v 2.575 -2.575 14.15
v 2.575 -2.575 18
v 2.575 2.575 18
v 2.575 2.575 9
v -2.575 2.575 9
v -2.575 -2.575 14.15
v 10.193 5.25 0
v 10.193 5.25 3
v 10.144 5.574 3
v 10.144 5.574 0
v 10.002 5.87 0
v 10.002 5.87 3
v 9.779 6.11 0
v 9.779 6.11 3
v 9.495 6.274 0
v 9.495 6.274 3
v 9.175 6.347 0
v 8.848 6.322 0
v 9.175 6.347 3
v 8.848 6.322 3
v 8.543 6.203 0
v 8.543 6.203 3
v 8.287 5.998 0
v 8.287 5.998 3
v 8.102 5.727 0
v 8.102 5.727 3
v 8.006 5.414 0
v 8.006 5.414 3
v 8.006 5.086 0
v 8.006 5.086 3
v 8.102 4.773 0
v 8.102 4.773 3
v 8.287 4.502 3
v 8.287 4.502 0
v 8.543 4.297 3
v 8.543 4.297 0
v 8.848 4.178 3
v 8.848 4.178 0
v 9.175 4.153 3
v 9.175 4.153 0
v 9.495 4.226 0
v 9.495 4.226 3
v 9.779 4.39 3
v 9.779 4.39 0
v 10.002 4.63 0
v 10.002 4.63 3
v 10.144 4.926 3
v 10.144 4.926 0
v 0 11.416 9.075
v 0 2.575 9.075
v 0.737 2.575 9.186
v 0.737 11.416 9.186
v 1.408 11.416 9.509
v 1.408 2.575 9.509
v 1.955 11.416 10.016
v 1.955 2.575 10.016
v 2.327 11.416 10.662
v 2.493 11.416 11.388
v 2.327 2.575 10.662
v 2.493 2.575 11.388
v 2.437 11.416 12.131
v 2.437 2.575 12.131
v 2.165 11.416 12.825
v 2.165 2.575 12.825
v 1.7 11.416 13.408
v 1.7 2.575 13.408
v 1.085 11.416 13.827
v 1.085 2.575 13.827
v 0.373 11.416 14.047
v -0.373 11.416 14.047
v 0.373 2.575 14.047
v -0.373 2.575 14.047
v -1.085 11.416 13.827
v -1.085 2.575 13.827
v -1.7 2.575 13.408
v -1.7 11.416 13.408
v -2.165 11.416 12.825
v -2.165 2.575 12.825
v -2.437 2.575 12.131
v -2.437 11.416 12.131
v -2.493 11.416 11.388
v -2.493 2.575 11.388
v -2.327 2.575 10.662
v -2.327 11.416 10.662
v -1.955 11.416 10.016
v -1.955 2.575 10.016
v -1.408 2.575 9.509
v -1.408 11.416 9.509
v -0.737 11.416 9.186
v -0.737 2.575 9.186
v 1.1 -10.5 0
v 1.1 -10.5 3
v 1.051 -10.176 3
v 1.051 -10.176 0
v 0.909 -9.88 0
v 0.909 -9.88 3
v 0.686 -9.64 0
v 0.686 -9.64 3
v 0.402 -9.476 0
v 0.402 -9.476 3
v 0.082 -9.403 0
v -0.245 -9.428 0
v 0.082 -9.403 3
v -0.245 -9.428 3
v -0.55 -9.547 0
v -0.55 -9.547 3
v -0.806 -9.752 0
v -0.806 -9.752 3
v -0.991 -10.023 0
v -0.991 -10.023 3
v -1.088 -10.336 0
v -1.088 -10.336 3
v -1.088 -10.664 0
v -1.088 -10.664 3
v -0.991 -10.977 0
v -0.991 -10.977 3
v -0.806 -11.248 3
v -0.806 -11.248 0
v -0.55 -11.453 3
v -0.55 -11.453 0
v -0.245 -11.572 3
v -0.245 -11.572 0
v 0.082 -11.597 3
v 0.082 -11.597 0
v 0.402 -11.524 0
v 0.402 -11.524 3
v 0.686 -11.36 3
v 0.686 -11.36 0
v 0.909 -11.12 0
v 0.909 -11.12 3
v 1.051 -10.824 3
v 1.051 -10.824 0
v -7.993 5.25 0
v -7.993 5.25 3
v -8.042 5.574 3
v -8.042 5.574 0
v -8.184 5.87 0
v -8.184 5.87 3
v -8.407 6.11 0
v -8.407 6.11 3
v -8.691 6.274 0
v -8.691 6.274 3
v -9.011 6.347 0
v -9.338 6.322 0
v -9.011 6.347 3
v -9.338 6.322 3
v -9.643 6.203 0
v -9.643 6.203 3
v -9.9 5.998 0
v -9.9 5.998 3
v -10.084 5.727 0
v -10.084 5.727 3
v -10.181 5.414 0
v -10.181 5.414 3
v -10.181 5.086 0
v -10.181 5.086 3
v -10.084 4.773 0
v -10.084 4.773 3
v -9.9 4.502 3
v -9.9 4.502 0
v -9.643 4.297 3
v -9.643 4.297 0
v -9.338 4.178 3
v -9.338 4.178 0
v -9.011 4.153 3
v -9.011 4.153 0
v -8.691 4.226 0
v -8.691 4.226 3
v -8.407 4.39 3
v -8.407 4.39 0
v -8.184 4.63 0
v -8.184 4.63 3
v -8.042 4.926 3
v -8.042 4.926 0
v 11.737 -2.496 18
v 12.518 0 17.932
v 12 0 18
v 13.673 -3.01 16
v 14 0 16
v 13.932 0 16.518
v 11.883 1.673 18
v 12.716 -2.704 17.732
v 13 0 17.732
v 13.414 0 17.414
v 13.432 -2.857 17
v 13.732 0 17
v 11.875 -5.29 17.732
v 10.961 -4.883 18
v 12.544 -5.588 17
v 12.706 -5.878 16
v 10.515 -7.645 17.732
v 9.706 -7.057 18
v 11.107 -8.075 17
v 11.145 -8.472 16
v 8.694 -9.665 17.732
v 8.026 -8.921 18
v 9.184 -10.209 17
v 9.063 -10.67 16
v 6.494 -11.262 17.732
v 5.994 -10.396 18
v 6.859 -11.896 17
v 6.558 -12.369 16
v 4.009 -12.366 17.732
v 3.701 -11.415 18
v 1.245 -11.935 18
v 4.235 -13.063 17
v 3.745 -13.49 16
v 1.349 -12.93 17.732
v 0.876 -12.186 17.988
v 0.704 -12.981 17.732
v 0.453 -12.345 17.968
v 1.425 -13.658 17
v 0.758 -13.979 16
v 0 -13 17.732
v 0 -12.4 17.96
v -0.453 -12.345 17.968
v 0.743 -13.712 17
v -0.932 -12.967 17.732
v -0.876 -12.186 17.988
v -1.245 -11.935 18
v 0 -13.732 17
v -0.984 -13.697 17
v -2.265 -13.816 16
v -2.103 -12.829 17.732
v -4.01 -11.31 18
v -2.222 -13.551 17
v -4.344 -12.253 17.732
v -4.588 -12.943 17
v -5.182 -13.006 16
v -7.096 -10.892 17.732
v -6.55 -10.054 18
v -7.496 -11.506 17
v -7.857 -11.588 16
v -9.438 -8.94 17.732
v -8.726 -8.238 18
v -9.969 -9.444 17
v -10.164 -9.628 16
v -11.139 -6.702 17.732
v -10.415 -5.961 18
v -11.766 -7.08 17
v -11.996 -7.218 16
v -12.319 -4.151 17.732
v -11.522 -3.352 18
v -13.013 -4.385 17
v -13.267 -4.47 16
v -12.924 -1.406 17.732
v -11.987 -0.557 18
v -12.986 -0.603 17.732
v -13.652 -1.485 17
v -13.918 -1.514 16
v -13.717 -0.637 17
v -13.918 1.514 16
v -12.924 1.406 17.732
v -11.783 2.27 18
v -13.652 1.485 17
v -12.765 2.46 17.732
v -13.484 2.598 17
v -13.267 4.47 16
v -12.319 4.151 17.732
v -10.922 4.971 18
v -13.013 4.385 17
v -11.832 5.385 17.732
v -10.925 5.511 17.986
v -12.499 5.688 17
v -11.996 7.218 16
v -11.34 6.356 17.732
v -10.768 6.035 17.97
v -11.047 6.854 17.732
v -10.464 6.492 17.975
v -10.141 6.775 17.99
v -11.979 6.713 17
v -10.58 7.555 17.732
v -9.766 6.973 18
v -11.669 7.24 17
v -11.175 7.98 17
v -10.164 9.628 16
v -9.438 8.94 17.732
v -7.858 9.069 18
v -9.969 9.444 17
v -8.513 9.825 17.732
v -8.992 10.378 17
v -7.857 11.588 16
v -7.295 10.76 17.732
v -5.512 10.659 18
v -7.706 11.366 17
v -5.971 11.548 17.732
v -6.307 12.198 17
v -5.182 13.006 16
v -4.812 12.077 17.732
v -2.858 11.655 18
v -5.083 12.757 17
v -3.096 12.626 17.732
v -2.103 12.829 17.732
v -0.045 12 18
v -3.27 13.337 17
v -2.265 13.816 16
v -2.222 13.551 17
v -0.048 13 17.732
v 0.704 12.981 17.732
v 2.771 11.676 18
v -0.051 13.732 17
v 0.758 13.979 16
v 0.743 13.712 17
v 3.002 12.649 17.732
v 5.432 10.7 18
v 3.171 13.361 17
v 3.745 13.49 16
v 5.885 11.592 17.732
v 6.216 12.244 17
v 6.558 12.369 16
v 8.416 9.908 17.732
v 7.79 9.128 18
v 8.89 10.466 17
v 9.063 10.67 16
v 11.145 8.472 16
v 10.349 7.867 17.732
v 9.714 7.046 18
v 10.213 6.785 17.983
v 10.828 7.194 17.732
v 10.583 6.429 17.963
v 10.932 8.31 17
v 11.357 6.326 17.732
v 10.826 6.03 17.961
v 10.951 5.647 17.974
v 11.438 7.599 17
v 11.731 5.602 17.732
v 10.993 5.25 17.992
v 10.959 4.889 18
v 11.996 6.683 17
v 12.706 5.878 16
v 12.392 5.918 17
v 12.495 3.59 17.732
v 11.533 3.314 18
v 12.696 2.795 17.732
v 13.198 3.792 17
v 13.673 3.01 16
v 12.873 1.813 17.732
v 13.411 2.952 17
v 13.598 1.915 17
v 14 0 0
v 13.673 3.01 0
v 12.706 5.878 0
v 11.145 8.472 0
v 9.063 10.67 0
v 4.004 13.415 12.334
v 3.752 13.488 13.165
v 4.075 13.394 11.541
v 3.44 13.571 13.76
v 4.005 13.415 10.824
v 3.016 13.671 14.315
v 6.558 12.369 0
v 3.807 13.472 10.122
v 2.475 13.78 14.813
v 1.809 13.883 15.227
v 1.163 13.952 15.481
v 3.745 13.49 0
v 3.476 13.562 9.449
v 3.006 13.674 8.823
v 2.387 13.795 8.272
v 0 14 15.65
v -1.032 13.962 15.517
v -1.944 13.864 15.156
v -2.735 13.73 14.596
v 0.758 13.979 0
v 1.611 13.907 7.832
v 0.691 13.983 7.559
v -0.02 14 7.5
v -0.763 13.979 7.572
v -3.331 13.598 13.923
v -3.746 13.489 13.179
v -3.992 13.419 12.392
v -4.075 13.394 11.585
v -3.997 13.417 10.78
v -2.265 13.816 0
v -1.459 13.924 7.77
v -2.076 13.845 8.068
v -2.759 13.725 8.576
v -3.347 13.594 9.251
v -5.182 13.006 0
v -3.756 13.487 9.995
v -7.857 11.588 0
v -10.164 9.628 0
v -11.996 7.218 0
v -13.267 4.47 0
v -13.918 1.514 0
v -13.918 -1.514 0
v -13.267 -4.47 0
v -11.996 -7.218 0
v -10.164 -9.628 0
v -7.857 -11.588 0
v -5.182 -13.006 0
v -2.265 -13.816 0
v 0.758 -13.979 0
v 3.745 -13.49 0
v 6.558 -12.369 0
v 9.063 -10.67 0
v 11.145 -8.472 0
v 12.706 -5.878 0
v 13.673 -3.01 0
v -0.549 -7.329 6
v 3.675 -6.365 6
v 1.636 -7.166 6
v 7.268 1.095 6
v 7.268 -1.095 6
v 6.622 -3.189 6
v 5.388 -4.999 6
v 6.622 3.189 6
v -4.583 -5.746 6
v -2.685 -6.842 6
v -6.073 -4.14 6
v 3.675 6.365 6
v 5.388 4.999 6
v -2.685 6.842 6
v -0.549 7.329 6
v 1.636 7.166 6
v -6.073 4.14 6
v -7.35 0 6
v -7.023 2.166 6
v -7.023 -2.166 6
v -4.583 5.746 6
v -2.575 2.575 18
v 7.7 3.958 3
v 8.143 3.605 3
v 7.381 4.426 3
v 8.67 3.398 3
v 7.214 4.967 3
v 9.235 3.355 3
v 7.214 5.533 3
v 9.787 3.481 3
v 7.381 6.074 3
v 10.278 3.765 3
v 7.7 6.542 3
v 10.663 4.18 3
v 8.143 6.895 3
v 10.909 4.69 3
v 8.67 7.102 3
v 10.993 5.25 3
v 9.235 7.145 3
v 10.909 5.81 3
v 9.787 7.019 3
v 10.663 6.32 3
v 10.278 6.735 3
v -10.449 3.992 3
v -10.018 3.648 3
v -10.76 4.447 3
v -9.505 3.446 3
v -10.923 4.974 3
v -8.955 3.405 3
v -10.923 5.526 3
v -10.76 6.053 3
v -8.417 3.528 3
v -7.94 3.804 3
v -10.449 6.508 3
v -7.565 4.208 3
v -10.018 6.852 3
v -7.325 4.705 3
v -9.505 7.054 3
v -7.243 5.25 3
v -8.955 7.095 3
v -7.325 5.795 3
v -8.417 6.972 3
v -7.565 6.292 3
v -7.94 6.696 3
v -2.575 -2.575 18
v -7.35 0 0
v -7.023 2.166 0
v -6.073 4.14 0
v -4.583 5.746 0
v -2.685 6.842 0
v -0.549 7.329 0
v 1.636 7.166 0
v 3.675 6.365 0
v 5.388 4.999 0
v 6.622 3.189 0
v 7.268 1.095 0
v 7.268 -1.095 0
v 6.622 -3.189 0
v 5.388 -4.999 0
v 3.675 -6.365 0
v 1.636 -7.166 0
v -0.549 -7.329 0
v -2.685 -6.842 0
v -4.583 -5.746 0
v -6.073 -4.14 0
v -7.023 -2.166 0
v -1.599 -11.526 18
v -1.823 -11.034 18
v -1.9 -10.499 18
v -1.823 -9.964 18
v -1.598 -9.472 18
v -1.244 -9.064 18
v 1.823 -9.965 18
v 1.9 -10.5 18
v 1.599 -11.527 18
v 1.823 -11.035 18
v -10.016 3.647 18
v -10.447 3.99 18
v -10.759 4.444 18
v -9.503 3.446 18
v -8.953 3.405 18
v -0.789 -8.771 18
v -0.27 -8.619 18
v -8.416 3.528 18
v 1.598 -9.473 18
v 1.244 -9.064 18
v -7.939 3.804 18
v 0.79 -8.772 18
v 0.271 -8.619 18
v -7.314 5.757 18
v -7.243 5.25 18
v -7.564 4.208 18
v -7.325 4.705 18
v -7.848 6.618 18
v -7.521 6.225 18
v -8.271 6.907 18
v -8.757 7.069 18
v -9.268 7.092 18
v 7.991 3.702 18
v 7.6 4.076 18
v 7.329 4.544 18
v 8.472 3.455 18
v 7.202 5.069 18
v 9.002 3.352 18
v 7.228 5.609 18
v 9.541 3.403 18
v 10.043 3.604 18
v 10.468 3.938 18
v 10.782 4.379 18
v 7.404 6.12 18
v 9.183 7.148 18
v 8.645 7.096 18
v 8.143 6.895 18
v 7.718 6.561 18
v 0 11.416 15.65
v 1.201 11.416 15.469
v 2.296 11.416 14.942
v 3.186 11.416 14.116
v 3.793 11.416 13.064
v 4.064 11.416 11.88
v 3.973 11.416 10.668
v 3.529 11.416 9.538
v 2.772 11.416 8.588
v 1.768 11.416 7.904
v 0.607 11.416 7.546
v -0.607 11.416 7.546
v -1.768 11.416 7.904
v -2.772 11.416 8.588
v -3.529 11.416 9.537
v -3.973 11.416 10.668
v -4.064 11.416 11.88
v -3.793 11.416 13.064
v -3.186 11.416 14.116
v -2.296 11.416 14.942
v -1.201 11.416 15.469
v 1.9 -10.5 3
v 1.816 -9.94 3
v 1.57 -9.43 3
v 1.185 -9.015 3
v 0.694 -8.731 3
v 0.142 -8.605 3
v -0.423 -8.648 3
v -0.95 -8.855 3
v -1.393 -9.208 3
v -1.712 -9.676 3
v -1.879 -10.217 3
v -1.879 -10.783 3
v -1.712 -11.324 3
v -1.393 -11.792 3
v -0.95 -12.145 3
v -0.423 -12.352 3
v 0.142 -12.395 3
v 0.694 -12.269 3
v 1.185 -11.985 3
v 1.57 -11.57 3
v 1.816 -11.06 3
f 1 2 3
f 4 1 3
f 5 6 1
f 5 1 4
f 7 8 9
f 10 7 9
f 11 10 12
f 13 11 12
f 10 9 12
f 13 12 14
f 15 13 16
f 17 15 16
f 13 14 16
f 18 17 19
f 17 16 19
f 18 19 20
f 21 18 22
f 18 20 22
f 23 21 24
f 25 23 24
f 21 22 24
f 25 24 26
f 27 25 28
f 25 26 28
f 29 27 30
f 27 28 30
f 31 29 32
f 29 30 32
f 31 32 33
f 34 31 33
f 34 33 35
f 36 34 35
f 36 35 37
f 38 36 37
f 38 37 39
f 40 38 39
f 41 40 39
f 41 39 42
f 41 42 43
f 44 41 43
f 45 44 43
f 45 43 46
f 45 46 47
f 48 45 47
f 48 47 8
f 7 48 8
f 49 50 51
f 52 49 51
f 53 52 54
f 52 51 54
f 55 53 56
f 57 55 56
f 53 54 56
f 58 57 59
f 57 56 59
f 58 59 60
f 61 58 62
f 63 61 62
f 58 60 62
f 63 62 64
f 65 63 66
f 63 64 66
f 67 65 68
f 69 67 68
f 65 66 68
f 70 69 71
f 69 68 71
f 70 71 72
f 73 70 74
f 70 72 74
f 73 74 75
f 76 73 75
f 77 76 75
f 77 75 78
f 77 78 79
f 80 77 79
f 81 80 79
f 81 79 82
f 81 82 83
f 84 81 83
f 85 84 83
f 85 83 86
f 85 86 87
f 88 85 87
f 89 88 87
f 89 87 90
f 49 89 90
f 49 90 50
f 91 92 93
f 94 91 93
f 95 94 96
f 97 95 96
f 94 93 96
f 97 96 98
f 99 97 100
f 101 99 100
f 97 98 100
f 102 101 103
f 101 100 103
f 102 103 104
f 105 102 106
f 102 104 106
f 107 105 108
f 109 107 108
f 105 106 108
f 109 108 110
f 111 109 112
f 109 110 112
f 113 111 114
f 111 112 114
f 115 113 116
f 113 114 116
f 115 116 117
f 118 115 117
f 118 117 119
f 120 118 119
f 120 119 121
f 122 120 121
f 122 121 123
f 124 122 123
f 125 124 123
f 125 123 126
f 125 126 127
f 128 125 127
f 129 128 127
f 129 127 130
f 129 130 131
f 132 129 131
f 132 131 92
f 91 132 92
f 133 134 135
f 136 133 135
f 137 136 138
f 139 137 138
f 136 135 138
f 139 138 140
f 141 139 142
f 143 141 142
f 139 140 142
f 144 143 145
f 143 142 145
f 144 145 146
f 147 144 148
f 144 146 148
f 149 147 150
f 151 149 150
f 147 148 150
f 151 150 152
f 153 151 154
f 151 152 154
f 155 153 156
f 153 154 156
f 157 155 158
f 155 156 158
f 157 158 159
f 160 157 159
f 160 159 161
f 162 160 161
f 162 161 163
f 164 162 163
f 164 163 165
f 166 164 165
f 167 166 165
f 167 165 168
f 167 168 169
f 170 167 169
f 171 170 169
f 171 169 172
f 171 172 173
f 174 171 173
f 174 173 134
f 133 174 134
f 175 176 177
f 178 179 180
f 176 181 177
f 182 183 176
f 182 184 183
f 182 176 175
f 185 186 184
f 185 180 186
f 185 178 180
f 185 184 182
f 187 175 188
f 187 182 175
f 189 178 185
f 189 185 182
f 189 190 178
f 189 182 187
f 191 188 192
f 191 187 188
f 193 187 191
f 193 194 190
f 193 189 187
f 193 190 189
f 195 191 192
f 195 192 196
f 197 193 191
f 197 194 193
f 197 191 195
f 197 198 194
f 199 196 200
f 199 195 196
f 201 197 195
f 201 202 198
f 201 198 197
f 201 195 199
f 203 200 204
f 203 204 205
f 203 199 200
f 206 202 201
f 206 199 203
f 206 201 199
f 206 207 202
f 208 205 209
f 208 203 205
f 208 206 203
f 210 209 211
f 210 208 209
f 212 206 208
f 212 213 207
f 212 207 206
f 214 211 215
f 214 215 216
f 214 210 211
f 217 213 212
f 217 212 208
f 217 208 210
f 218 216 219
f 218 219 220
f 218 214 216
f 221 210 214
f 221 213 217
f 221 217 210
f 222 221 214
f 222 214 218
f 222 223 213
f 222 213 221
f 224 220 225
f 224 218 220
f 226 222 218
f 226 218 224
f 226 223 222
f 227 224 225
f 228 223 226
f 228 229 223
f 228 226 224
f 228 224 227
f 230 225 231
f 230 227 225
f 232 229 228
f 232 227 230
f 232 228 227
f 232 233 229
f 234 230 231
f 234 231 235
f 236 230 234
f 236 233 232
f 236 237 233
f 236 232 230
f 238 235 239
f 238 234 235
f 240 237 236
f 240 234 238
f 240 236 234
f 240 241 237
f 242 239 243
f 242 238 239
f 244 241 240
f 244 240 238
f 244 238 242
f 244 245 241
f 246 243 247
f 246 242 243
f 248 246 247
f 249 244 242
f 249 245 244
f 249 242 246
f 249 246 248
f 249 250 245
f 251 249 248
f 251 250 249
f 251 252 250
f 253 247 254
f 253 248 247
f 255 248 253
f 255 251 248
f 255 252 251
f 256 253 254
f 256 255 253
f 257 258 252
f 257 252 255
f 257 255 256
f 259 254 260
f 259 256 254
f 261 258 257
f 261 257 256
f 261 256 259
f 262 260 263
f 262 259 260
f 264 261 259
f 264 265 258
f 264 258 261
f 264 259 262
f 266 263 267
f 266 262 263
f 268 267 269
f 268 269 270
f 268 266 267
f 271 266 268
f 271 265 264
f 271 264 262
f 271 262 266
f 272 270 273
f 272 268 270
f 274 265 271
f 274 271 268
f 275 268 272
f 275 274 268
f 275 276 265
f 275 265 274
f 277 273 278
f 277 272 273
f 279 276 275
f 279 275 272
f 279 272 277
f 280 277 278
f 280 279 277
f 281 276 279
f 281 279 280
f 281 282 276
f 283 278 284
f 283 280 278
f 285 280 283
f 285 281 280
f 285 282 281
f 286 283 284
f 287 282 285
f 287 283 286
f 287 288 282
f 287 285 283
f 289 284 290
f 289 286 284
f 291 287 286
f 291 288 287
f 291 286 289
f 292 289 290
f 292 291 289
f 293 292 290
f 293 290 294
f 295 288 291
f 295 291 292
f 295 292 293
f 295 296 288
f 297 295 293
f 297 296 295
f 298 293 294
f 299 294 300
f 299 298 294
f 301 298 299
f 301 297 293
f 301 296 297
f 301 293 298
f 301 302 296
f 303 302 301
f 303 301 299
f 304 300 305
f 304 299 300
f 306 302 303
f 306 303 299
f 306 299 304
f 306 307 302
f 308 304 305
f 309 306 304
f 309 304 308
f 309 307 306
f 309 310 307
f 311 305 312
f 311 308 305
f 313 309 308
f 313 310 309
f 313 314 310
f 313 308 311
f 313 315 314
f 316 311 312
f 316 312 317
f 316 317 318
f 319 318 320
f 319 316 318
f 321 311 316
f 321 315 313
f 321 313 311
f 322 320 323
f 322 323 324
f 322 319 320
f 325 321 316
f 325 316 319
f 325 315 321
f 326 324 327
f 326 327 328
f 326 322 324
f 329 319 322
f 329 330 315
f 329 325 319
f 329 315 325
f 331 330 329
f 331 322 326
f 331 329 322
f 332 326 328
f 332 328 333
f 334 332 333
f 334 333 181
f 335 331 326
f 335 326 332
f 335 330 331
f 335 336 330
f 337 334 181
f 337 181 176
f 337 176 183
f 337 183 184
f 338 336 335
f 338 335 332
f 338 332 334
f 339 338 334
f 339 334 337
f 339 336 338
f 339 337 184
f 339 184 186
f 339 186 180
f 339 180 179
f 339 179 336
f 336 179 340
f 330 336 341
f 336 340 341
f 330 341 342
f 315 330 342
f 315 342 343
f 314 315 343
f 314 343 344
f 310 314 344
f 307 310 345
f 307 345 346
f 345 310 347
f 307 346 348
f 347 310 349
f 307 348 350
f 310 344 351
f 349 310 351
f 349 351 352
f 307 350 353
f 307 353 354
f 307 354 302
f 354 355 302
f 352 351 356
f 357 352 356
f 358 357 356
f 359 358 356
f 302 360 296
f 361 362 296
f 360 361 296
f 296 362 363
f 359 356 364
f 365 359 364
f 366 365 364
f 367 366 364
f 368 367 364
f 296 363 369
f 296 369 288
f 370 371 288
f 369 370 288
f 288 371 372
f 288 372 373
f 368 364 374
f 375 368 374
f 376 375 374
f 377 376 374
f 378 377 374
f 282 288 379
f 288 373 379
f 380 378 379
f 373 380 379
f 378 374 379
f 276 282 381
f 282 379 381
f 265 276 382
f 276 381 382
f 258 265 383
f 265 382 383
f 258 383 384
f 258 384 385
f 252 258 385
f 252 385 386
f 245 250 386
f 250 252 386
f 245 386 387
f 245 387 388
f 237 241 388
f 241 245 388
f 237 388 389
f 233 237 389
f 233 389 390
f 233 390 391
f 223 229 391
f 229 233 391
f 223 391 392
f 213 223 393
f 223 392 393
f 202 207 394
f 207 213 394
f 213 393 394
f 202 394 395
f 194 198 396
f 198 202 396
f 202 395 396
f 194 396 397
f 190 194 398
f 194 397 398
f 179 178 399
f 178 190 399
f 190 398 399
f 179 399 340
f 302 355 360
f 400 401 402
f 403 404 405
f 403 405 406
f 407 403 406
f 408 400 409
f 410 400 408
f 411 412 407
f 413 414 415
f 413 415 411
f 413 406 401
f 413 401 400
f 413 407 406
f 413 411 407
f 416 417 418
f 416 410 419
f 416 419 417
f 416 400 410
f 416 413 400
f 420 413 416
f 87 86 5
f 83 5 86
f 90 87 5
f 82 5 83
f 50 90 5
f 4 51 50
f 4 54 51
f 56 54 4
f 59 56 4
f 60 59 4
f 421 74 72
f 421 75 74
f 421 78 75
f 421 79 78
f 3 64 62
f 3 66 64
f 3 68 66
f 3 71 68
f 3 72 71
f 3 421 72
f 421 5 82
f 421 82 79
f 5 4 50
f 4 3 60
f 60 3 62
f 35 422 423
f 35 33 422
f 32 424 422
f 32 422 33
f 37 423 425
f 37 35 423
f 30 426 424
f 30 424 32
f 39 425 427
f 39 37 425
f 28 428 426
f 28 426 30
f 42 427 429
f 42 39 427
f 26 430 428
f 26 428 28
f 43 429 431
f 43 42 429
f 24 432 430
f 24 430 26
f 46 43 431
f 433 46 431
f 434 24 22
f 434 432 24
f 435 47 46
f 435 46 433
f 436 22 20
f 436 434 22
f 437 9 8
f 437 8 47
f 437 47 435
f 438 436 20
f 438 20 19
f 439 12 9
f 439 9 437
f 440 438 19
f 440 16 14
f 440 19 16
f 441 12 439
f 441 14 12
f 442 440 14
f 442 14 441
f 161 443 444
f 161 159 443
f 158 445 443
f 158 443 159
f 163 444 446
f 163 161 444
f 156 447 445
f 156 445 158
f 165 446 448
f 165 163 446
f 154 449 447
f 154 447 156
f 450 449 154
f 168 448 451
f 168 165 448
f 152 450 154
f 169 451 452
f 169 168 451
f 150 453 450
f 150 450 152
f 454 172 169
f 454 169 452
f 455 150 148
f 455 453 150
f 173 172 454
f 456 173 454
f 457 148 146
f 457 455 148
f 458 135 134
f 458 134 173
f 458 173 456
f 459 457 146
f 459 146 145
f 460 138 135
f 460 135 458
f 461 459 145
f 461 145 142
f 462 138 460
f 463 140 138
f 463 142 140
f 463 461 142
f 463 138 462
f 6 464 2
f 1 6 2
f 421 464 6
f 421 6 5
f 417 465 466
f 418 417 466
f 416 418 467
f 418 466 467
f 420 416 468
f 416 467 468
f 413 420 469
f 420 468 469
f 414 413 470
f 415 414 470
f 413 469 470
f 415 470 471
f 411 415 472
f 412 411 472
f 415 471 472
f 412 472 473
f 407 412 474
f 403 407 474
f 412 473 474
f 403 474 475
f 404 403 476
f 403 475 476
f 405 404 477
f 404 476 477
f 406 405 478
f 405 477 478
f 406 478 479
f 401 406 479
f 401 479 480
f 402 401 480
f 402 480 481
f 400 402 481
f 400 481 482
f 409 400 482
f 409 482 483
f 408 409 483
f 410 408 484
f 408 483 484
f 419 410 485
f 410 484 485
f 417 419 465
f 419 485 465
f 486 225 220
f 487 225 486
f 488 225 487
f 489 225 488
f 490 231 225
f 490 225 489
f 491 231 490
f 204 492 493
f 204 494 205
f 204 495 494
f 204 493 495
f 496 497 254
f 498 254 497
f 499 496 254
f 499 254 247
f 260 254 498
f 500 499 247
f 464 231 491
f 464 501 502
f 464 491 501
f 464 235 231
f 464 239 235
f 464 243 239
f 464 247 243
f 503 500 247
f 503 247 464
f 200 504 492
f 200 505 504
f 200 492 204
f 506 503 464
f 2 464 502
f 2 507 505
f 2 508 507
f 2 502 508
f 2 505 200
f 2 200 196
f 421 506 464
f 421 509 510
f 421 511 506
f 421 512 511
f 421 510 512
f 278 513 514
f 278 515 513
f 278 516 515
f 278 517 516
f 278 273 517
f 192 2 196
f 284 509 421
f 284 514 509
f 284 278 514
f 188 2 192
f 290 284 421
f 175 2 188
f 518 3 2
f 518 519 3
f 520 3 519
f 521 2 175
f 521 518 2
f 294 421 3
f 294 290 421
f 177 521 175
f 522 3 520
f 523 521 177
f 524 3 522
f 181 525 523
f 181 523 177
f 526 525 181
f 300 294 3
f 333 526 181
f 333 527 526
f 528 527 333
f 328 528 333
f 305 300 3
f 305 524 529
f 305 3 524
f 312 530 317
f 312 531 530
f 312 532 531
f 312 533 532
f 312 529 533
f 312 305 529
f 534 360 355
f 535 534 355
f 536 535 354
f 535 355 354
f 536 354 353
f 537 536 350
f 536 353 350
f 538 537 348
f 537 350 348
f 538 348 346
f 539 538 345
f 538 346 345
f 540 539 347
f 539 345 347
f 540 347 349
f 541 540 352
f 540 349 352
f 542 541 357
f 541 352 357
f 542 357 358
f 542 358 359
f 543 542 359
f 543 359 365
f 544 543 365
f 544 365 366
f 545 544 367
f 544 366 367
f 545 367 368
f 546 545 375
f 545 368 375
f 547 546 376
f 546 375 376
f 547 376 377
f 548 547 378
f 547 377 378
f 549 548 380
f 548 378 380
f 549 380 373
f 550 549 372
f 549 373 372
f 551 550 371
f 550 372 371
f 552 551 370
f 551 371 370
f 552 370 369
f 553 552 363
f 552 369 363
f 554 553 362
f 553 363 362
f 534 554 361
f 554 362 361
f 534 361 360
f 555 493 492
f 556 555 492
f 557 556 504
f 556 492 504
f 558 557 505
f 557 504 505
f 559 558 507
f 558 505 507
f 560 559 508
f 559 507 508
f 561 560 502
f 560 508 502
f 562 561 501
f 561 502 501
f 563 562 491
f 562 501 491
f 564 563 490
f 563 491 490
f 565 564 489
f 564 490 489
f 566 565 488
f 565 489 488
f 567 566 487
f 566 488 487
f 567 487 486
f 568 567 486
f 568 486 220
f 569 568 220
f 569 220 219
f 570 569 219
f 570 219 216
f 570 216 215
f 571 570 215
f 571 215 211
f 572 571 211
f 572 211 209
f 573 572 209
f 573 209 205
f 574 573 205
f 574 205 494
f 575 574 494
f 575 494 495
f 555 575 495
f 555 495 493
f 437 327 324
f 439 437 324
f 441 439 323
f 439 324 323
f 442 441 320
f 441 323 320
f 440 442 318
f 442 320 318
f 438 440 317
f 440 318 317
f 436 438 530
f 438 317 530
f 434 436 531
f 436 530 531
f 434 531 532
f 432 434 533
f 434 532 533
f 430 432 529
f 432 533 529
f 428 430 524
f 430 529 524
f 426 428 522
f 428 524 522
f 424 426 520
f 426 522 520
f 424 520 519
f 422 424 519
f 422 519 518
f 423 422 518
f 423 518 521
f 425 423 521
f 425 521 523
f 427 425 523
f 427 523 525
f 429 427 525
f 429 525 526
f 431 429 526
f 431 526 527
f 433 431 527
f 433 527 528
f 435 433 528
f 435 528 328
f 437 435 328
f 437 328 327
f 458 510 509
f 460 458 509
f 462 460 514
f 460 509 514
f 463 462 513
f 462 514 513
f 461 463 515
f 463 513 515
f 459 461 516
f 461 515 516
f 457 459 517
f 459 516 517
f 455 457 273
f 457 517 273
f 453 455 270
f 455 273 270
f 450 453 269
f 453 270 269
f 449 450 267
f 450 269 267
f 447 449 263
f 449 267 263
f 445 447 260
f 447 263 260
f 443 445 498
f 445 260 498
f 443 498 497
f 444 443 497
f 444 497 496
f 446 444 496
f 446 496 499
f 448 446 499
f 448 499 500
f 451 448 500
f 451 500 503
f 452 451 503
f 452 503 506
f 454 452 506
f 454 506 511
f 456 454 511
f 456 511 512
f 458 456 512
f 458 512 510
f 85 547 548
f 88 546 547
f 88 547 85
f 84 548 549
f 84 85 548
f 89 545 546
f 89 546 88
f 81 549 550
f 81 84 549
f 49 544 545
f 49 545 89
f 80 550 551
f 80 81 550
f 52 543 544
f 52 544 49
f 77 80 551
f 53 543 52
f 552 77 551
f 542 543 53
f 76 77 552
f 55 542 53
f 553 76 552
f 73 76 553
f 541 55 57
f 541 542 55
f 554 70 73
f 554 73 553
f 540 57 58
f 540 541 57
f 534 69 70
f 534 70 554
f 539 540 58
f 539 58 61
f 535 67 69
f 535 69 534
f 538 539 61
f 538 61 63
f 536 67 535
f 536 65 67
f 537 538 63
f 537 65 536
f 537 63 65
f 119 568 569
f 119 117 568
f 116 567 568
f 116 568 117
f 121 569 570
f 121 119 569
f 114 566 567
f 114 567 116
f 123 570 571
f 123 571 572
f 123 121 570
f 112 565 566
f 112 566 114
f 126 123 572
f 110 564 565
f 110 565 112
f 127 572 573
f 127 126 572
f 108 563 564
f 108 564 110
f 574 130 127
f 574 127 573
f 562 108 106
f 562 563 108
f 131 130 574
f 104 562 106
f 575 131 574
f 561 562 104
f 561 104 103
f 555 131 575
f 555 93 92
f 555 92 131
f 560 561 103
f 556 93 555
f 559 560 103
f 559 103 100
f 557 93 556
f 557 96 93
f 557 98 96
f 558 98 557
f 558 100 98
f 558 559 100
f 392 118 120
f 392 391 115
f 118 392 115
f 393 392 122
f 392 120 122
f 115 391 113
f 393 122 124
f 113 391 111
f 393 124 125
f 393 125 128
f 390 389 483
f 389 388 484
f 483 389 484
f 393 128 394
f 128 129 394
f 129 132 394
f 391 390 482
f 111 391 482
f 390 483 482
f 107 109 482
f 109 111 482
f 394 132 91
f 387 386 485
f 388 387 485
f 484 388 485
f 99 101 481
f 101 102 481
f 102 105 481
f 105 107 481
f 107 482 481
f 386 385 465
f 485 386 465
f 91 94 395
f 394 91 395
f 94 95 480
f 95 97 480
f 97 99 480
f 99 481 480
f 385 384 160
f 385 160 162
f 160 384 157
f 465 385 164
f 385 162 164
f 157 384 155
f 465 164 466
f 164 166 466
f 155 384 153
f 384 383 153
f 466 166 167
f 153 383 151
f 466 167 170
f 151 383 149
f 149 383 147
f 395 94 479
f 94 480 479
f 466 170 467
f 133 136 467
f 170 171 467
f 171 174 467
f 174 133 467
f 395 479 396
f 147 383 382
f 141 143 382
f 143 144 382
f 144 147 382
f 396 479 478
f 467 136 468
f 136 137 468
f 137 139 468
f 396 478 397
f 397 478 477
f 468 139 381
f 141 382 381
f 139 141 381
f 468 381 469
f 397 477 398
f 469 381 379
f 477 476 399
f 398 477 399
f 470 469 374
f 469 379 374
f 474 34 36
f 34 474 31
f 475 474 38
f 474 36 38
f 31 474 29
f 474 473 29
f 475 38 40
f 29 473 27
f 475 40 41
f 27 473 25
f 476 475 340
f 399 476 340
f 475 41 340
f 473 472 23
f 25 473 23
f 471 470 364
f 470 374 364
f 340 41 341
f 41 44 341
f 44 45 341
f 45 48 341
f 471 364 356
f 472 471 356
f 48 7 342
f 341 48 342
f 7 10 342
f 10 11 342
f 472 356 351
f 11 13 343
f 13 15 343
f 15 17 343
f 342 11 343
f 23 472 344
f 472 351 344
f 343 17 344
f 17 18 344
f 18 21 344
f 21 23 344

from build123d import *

# Parameters (mm, degrees)
SKETCH_1_R           = 14
EXTRUDE_1_DEPTH      = 22
SKETCH_3_R           = 7.35
CUT_EXTRUDE_1_DEPTH  = 6
SKETCH_2_R           = 1.1
CUT_EXTRUDE_2_DEPTH  = 32
SKETCH_4_R           = 1.9
SKETCH_4_R_2         = 1.85
CUT_EXTRUDE_3_DEPTH  = 19
SKETCH_5_W           = 5.15
SKETCH_5_H           = 5.15
CUT_EXTRUDE_4_DEPTH  = 13
EXTRUDE_2_REACH      = 32.899
SKETCH_12_R          = 19.208398283
CUT_EXTRUDE_9_DEPTH  = 4
FILLET_1_R           = 2
SKETCH_14_R          = 2.5
CUT_EXTRUDE_10_DEPTH = 18
SKETCH_15_R          = 4.075
CUT_EXTRUDE_11_DEPTH = 2


with BuildPart() as part:
    # 草图1 → 凸台-拉伸1 (new body)
    with BuildSketch(Plane.XY):
        Circle(SKETCH_1_R)
    extrude(amount=EXTRUDE_1_DEPTH)

    # 草图3 → 切除-拉伸1 (cut)
    with BuildSketch(Plane(origin=(0, 0, 0), x_dir=(-1, 0, 0), z_dir=(0, 0, -1))):
        Circle(SKETCH_3_R)
    extrude(amount=-CUT_EXTRUDE_1_DEPTH, mode=Mode.SUBTRACT)

    # 草图2 → 切除-拉伸2 (cut)
    with BuildSketch(Plane.XY.offset(22)):
        with Locations((-9.09326674, 5.25)):
            Circle(SKETCH_2_R)
        with Locations((9.09326674, 5.25)):
            Circle(SKETCH_2_R)
        with Locations((0, -10.5)):
            Circle(SKETCH_2_R)
    extrude(amount=-CUT_EXTRUDE_2_DEPTH, mode=Mode.SUBTRACT)

    # 草图4 → 切除-拉伸3 (cut)
    with BuildSketch(Plane.XY.offset(22)):
        with Locations((9.09326674, 5.25)):
            Circle(SKETCH_4_R)
        with Locations((0, -10.5)):
            Circle(SKETCH_4_R)
        with Locations((-9.09326674, 5.25)):
            Circle(SKETCH_4_R_2)
    extrude(amount=-CUT_EXTRUDE_3_DEPTH, mode=Mode.SUBTRACT)

    # 草图5 → 切除-拉伸4 (cut)
    with BuildSketch(Plane.XY.offset(22)):
        Rectangle(SKETCH_5_W, SKETCH_5_H)
    extrude(amount=-CUT_EXTRUDE_4_DEPTH, mode=Mode.SUBTRACT)

    # 草图6 → 凸台-拉伸2 (add, up to next)
    with BuildSketch(Plane(origin=(-2.575, 0, 0), x_dir=(0, 0, -1), z_dir=(1, 0, 0)), mode=Mode.PRIVATE) as extrude_2_sk1:
        Polygon((-9, -2.575), (-14.15, -2.575), (-9, 2.575), align=None)
    extrude_2_tool1 = extrude(extrude_2_sk1.sketch, amount=EXTRUDE_2_REACH, mode=Mode.PRIVATE) - part.part
    add(extrude_2_tool1.solids().sort_by_distance((-2.575, -0.858333, 10.716667))[0])

    # 草图12 → 切除-拉伸9 (cut)
    with BuildSketch(Plane.XY.offset(22)):
        Circle(SKETCH_12_R)
    extrude(amount=-CUT_EXTRUDE_9_DEPTH, mode=Mode.SUBTRACT)

    # 圆角1
    # the kernel refuses this fillet: 2 mm, written as the material it takes off along each edge
    with BuildSketch(Plane(origin=(0, 0, 18), x_dir=(1, 0, 0), z_dir=(0, 1, 0))) as fillet_1_piece_1:
        with BuildLine():
            CenterArc((14 - FILLET_1_R, FILLET_1_R), FILLET_1_R, 270, 90)
            Line((14, FILLET_1_R), (14, 0))
            Line((14, 0), (14 - FILLET_1_R, 0))
        make_face()
    revolve(axis=Axis((0, 0, 18), (0, 0, -1)), mode=Mode.SUBTRACT)

    # 草图14 → 切除-拉伸10 (cut)
    with BuildSketch(Plane(origin=(0, 2.575, 0), x_dir=(-1, 0, 0), z_dir=(0, -1, 0))):
        with Locations(Location((0, -11.575, 0), (0, 0, 90))):
            Circle(SKETCH_14_R)
    extrude(amount=-CUT_EXTRUDE_10_DEPTH, mode=Mode.SUBTRACT)

    # 草图15 → 切除-拉伸11 (cut, symmetric)
    with BuildSketch(Plane(origin=(0, 13.416407865, 0), x_dir=(1, 0, 0), z_dir=(0, 1, 0))):
        with Locations(Location((0, -11.575, 0), (0, 0, 270))):
            Circle(SKETCH_15_R)
    extrude(amount=CUT_EXTRUDE_11_DEPTH, both=True, mode=Mode.SUBTRACT)


solid = part.part
